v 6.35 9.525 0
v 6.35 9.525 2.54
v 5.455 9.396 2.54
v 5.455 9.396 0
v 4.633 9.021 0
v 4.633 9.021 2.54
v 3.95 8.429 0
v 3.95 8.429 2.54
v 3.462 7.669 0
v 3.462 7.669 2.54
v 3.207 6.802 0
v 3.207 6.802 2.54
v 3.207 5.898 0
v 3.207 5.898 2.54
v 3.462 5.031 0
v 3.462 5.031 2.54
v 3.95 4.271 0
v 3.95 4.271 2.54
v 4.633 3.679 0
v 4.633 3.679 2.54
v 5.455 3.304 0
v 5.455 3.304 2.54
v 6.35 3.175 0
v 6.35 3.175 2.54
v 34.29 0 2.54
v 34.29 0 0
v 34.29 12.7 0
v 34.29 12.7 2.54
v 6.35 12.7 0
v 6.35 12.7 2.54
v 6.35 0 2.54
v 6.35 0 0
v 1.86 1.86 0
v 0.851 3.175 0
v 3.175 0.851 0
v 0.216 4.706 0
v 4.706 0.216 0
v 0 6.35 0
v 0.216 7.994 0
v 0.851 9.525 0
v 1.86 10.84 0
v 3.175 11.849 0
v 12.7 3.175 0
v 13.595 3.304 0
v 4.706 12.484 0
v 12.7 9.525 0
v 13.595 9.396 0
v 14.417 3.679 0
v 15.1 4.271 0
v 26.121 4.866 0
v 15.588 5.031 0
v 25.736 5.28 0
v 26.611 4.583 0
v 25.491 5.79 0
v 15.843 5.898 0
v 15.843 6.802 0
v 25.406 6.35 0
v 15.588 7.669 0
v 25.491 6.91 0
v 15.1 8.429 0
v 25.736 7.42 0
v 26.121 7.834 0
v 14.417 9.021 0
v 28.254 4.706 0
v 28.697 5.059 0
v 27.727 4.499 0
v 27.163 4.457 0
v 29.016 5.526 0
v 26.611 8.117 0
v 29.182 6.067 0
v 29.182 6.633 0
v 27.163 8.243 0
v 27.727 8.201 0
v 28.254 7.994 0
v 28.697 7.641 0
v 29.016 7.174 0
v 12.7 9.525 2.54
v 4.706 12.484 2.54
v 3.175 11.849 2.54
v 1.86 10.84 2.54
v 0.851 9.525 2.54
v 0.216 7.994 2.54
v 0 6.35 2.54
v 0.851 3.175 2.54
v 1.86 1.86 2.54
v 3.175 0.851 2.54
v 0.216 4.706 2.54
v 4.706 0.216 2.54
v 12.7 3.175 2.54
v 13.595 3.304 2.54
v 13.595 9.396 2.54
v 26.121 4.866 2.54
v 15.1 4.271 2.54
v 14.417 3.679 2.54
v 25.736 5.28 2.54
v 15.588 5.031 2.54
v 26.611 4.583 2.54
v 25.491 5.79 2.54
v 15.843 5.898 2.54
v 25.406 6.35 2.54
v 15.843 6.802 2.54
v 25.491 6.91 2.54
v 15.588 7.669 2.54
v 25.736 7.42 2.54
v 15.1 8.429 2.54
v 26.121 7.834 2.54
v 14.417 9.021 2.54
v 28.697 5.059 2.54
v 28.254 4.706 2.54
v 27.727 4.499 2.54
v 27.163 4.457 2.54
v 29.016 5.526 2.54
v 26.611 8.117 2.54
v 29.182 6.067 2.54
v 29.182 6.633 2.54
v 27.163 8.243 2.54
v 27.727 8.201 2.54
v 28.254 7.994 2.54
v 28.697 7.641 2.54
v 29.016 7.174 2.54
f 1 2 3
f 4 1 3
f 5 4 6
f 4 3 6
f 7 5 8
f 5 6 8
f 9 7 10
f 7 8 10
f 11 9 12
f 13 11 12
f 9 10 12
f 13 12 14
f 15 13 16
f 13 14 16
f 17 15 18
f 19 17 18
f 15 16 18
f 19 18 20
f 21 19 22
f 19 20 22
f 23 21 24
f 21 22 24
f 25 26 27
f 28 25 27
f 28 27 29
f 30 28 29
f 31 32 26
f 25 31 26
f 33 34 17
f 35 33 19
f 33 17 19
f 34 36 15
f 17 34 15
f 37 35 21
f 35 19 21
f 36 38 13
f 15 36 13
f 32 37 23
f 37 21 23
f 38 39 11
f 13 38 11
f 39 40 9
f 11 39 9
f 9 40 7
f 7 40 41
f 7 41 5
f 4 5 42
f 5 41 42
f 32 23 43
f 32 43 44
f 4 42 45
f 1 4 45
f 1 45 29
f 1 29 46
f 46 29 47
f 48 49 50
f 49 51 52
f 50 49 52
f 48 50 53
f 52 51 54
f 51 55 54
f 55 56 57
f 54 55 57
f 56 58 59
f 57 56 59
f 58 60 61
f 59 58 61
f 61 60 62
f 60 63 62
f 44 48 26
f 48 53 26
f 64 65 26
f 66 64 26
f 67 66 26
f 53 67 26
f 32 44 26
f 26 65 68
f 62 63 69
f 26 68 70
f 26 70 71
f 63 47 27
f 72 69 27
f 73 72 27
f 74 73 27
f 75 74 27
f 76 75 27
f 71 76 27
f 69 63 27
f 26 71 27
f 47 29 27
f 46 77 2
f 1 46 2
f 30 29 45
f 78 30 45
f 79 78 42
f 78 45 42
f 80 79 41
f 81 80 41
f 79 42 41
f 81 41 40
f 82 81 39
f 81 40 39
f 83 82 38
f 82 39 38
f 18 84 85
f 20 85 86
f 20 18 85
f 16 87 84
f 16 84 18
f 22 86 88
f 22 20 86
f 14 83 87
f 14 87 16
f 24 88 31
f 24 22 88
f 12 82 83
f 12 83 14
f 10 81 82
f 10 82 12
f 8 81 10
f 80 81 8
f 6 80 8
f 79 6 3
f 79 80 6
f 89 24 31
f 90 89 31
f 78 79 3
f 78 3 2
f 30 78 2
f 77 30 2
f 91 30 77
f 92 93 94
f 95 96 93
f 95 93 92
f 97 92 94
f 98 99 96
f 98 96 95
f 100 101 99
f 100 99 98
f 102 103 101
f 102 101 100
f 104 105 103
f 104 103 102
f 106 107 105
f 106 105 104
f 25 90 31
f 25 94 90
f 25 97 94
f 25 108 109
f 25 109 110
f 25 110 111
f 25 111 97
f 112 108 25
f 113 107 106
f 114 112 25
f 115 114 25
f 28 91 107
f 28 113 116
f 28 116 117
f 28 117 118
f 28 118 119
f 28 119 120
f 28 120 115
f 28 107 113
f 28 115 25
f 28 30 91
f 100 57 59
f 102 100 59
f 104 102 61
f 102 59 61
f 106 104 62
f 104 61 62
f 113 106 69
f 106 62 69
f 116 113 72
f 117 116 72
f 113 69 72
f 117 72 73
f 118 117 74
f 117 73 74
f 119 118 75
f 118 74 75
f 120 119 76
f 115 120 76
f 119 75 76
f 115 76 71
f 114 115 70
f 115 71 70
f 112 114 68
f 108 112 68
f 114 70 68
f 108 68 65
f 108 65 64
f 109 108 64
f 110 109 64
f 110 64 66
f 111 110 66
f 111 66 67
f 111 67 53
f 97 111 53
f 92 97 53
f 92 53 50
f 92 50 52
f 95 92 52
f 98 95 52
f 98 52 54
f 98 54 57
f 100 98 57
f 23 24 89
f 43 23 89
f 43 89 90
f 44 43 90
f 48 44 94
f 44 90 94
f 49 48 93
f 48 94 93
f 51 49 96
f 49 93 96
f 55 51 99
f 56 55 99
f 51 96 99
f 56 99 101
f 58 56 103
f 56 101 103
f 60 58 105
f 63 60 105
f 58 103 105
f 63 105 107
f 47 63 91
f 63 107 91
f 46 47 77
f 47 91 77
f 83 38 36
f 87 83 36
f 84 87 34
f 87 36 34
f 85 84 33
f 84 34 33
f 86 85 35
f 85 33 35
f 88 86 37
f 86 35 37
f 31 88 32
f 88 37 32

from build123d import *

# Parameters (mm, degrees)
F1_DEPTH = 2.54
F3_DEPTH = 2.541
F5_D     = 3.7973


with BuildPart() as f1:
    # F0 (on Top) → F1 (new body)
    with BuildSketch(Plane.XY):
        with BuildLine():
            ThreePointArc((0, 6.35), (1.8598719395, 1.8598719395), (6.35, 0))
            Line((6.35, 0), (34.29, 0))
            Line((34.29, 0), (34.29, 12.7))
            Line((34.29, 12.7), (6.35, 12.7))
            ThreePointArc((6.35, 12.7), (1.8598719395, 10.8401280605), (0, 6.35))
        make_face()
    extrude(amount=F1_DEPTH)

    # F2 (on face) → F3 (cut, through all)
    with BuildSketch(Plane.XY.offset(2.54)):
        with BuildLine():
            Line((12.7, 9.525), (6.35, 9.525))
            ThreePointArc((6.35, 9.525), (3.175, 6.35), (6.35, 3.175))
            Line((6.35, 3.175), (12.7, 3.175))
            ThreePointArc((12.7, 3.175), (15.875, 6.35), (12.7, 9.525))
        make_face()
    extrude(amount=-F3_DEPTH, mode=Mode.SUBTRACT)

    # F5 (through all)
    with Locations(Plane.XY.offset(2.54)):
        with Locations((27.305, 6.35)):
            Hole(F5_D / 2)


solid = f1.part
